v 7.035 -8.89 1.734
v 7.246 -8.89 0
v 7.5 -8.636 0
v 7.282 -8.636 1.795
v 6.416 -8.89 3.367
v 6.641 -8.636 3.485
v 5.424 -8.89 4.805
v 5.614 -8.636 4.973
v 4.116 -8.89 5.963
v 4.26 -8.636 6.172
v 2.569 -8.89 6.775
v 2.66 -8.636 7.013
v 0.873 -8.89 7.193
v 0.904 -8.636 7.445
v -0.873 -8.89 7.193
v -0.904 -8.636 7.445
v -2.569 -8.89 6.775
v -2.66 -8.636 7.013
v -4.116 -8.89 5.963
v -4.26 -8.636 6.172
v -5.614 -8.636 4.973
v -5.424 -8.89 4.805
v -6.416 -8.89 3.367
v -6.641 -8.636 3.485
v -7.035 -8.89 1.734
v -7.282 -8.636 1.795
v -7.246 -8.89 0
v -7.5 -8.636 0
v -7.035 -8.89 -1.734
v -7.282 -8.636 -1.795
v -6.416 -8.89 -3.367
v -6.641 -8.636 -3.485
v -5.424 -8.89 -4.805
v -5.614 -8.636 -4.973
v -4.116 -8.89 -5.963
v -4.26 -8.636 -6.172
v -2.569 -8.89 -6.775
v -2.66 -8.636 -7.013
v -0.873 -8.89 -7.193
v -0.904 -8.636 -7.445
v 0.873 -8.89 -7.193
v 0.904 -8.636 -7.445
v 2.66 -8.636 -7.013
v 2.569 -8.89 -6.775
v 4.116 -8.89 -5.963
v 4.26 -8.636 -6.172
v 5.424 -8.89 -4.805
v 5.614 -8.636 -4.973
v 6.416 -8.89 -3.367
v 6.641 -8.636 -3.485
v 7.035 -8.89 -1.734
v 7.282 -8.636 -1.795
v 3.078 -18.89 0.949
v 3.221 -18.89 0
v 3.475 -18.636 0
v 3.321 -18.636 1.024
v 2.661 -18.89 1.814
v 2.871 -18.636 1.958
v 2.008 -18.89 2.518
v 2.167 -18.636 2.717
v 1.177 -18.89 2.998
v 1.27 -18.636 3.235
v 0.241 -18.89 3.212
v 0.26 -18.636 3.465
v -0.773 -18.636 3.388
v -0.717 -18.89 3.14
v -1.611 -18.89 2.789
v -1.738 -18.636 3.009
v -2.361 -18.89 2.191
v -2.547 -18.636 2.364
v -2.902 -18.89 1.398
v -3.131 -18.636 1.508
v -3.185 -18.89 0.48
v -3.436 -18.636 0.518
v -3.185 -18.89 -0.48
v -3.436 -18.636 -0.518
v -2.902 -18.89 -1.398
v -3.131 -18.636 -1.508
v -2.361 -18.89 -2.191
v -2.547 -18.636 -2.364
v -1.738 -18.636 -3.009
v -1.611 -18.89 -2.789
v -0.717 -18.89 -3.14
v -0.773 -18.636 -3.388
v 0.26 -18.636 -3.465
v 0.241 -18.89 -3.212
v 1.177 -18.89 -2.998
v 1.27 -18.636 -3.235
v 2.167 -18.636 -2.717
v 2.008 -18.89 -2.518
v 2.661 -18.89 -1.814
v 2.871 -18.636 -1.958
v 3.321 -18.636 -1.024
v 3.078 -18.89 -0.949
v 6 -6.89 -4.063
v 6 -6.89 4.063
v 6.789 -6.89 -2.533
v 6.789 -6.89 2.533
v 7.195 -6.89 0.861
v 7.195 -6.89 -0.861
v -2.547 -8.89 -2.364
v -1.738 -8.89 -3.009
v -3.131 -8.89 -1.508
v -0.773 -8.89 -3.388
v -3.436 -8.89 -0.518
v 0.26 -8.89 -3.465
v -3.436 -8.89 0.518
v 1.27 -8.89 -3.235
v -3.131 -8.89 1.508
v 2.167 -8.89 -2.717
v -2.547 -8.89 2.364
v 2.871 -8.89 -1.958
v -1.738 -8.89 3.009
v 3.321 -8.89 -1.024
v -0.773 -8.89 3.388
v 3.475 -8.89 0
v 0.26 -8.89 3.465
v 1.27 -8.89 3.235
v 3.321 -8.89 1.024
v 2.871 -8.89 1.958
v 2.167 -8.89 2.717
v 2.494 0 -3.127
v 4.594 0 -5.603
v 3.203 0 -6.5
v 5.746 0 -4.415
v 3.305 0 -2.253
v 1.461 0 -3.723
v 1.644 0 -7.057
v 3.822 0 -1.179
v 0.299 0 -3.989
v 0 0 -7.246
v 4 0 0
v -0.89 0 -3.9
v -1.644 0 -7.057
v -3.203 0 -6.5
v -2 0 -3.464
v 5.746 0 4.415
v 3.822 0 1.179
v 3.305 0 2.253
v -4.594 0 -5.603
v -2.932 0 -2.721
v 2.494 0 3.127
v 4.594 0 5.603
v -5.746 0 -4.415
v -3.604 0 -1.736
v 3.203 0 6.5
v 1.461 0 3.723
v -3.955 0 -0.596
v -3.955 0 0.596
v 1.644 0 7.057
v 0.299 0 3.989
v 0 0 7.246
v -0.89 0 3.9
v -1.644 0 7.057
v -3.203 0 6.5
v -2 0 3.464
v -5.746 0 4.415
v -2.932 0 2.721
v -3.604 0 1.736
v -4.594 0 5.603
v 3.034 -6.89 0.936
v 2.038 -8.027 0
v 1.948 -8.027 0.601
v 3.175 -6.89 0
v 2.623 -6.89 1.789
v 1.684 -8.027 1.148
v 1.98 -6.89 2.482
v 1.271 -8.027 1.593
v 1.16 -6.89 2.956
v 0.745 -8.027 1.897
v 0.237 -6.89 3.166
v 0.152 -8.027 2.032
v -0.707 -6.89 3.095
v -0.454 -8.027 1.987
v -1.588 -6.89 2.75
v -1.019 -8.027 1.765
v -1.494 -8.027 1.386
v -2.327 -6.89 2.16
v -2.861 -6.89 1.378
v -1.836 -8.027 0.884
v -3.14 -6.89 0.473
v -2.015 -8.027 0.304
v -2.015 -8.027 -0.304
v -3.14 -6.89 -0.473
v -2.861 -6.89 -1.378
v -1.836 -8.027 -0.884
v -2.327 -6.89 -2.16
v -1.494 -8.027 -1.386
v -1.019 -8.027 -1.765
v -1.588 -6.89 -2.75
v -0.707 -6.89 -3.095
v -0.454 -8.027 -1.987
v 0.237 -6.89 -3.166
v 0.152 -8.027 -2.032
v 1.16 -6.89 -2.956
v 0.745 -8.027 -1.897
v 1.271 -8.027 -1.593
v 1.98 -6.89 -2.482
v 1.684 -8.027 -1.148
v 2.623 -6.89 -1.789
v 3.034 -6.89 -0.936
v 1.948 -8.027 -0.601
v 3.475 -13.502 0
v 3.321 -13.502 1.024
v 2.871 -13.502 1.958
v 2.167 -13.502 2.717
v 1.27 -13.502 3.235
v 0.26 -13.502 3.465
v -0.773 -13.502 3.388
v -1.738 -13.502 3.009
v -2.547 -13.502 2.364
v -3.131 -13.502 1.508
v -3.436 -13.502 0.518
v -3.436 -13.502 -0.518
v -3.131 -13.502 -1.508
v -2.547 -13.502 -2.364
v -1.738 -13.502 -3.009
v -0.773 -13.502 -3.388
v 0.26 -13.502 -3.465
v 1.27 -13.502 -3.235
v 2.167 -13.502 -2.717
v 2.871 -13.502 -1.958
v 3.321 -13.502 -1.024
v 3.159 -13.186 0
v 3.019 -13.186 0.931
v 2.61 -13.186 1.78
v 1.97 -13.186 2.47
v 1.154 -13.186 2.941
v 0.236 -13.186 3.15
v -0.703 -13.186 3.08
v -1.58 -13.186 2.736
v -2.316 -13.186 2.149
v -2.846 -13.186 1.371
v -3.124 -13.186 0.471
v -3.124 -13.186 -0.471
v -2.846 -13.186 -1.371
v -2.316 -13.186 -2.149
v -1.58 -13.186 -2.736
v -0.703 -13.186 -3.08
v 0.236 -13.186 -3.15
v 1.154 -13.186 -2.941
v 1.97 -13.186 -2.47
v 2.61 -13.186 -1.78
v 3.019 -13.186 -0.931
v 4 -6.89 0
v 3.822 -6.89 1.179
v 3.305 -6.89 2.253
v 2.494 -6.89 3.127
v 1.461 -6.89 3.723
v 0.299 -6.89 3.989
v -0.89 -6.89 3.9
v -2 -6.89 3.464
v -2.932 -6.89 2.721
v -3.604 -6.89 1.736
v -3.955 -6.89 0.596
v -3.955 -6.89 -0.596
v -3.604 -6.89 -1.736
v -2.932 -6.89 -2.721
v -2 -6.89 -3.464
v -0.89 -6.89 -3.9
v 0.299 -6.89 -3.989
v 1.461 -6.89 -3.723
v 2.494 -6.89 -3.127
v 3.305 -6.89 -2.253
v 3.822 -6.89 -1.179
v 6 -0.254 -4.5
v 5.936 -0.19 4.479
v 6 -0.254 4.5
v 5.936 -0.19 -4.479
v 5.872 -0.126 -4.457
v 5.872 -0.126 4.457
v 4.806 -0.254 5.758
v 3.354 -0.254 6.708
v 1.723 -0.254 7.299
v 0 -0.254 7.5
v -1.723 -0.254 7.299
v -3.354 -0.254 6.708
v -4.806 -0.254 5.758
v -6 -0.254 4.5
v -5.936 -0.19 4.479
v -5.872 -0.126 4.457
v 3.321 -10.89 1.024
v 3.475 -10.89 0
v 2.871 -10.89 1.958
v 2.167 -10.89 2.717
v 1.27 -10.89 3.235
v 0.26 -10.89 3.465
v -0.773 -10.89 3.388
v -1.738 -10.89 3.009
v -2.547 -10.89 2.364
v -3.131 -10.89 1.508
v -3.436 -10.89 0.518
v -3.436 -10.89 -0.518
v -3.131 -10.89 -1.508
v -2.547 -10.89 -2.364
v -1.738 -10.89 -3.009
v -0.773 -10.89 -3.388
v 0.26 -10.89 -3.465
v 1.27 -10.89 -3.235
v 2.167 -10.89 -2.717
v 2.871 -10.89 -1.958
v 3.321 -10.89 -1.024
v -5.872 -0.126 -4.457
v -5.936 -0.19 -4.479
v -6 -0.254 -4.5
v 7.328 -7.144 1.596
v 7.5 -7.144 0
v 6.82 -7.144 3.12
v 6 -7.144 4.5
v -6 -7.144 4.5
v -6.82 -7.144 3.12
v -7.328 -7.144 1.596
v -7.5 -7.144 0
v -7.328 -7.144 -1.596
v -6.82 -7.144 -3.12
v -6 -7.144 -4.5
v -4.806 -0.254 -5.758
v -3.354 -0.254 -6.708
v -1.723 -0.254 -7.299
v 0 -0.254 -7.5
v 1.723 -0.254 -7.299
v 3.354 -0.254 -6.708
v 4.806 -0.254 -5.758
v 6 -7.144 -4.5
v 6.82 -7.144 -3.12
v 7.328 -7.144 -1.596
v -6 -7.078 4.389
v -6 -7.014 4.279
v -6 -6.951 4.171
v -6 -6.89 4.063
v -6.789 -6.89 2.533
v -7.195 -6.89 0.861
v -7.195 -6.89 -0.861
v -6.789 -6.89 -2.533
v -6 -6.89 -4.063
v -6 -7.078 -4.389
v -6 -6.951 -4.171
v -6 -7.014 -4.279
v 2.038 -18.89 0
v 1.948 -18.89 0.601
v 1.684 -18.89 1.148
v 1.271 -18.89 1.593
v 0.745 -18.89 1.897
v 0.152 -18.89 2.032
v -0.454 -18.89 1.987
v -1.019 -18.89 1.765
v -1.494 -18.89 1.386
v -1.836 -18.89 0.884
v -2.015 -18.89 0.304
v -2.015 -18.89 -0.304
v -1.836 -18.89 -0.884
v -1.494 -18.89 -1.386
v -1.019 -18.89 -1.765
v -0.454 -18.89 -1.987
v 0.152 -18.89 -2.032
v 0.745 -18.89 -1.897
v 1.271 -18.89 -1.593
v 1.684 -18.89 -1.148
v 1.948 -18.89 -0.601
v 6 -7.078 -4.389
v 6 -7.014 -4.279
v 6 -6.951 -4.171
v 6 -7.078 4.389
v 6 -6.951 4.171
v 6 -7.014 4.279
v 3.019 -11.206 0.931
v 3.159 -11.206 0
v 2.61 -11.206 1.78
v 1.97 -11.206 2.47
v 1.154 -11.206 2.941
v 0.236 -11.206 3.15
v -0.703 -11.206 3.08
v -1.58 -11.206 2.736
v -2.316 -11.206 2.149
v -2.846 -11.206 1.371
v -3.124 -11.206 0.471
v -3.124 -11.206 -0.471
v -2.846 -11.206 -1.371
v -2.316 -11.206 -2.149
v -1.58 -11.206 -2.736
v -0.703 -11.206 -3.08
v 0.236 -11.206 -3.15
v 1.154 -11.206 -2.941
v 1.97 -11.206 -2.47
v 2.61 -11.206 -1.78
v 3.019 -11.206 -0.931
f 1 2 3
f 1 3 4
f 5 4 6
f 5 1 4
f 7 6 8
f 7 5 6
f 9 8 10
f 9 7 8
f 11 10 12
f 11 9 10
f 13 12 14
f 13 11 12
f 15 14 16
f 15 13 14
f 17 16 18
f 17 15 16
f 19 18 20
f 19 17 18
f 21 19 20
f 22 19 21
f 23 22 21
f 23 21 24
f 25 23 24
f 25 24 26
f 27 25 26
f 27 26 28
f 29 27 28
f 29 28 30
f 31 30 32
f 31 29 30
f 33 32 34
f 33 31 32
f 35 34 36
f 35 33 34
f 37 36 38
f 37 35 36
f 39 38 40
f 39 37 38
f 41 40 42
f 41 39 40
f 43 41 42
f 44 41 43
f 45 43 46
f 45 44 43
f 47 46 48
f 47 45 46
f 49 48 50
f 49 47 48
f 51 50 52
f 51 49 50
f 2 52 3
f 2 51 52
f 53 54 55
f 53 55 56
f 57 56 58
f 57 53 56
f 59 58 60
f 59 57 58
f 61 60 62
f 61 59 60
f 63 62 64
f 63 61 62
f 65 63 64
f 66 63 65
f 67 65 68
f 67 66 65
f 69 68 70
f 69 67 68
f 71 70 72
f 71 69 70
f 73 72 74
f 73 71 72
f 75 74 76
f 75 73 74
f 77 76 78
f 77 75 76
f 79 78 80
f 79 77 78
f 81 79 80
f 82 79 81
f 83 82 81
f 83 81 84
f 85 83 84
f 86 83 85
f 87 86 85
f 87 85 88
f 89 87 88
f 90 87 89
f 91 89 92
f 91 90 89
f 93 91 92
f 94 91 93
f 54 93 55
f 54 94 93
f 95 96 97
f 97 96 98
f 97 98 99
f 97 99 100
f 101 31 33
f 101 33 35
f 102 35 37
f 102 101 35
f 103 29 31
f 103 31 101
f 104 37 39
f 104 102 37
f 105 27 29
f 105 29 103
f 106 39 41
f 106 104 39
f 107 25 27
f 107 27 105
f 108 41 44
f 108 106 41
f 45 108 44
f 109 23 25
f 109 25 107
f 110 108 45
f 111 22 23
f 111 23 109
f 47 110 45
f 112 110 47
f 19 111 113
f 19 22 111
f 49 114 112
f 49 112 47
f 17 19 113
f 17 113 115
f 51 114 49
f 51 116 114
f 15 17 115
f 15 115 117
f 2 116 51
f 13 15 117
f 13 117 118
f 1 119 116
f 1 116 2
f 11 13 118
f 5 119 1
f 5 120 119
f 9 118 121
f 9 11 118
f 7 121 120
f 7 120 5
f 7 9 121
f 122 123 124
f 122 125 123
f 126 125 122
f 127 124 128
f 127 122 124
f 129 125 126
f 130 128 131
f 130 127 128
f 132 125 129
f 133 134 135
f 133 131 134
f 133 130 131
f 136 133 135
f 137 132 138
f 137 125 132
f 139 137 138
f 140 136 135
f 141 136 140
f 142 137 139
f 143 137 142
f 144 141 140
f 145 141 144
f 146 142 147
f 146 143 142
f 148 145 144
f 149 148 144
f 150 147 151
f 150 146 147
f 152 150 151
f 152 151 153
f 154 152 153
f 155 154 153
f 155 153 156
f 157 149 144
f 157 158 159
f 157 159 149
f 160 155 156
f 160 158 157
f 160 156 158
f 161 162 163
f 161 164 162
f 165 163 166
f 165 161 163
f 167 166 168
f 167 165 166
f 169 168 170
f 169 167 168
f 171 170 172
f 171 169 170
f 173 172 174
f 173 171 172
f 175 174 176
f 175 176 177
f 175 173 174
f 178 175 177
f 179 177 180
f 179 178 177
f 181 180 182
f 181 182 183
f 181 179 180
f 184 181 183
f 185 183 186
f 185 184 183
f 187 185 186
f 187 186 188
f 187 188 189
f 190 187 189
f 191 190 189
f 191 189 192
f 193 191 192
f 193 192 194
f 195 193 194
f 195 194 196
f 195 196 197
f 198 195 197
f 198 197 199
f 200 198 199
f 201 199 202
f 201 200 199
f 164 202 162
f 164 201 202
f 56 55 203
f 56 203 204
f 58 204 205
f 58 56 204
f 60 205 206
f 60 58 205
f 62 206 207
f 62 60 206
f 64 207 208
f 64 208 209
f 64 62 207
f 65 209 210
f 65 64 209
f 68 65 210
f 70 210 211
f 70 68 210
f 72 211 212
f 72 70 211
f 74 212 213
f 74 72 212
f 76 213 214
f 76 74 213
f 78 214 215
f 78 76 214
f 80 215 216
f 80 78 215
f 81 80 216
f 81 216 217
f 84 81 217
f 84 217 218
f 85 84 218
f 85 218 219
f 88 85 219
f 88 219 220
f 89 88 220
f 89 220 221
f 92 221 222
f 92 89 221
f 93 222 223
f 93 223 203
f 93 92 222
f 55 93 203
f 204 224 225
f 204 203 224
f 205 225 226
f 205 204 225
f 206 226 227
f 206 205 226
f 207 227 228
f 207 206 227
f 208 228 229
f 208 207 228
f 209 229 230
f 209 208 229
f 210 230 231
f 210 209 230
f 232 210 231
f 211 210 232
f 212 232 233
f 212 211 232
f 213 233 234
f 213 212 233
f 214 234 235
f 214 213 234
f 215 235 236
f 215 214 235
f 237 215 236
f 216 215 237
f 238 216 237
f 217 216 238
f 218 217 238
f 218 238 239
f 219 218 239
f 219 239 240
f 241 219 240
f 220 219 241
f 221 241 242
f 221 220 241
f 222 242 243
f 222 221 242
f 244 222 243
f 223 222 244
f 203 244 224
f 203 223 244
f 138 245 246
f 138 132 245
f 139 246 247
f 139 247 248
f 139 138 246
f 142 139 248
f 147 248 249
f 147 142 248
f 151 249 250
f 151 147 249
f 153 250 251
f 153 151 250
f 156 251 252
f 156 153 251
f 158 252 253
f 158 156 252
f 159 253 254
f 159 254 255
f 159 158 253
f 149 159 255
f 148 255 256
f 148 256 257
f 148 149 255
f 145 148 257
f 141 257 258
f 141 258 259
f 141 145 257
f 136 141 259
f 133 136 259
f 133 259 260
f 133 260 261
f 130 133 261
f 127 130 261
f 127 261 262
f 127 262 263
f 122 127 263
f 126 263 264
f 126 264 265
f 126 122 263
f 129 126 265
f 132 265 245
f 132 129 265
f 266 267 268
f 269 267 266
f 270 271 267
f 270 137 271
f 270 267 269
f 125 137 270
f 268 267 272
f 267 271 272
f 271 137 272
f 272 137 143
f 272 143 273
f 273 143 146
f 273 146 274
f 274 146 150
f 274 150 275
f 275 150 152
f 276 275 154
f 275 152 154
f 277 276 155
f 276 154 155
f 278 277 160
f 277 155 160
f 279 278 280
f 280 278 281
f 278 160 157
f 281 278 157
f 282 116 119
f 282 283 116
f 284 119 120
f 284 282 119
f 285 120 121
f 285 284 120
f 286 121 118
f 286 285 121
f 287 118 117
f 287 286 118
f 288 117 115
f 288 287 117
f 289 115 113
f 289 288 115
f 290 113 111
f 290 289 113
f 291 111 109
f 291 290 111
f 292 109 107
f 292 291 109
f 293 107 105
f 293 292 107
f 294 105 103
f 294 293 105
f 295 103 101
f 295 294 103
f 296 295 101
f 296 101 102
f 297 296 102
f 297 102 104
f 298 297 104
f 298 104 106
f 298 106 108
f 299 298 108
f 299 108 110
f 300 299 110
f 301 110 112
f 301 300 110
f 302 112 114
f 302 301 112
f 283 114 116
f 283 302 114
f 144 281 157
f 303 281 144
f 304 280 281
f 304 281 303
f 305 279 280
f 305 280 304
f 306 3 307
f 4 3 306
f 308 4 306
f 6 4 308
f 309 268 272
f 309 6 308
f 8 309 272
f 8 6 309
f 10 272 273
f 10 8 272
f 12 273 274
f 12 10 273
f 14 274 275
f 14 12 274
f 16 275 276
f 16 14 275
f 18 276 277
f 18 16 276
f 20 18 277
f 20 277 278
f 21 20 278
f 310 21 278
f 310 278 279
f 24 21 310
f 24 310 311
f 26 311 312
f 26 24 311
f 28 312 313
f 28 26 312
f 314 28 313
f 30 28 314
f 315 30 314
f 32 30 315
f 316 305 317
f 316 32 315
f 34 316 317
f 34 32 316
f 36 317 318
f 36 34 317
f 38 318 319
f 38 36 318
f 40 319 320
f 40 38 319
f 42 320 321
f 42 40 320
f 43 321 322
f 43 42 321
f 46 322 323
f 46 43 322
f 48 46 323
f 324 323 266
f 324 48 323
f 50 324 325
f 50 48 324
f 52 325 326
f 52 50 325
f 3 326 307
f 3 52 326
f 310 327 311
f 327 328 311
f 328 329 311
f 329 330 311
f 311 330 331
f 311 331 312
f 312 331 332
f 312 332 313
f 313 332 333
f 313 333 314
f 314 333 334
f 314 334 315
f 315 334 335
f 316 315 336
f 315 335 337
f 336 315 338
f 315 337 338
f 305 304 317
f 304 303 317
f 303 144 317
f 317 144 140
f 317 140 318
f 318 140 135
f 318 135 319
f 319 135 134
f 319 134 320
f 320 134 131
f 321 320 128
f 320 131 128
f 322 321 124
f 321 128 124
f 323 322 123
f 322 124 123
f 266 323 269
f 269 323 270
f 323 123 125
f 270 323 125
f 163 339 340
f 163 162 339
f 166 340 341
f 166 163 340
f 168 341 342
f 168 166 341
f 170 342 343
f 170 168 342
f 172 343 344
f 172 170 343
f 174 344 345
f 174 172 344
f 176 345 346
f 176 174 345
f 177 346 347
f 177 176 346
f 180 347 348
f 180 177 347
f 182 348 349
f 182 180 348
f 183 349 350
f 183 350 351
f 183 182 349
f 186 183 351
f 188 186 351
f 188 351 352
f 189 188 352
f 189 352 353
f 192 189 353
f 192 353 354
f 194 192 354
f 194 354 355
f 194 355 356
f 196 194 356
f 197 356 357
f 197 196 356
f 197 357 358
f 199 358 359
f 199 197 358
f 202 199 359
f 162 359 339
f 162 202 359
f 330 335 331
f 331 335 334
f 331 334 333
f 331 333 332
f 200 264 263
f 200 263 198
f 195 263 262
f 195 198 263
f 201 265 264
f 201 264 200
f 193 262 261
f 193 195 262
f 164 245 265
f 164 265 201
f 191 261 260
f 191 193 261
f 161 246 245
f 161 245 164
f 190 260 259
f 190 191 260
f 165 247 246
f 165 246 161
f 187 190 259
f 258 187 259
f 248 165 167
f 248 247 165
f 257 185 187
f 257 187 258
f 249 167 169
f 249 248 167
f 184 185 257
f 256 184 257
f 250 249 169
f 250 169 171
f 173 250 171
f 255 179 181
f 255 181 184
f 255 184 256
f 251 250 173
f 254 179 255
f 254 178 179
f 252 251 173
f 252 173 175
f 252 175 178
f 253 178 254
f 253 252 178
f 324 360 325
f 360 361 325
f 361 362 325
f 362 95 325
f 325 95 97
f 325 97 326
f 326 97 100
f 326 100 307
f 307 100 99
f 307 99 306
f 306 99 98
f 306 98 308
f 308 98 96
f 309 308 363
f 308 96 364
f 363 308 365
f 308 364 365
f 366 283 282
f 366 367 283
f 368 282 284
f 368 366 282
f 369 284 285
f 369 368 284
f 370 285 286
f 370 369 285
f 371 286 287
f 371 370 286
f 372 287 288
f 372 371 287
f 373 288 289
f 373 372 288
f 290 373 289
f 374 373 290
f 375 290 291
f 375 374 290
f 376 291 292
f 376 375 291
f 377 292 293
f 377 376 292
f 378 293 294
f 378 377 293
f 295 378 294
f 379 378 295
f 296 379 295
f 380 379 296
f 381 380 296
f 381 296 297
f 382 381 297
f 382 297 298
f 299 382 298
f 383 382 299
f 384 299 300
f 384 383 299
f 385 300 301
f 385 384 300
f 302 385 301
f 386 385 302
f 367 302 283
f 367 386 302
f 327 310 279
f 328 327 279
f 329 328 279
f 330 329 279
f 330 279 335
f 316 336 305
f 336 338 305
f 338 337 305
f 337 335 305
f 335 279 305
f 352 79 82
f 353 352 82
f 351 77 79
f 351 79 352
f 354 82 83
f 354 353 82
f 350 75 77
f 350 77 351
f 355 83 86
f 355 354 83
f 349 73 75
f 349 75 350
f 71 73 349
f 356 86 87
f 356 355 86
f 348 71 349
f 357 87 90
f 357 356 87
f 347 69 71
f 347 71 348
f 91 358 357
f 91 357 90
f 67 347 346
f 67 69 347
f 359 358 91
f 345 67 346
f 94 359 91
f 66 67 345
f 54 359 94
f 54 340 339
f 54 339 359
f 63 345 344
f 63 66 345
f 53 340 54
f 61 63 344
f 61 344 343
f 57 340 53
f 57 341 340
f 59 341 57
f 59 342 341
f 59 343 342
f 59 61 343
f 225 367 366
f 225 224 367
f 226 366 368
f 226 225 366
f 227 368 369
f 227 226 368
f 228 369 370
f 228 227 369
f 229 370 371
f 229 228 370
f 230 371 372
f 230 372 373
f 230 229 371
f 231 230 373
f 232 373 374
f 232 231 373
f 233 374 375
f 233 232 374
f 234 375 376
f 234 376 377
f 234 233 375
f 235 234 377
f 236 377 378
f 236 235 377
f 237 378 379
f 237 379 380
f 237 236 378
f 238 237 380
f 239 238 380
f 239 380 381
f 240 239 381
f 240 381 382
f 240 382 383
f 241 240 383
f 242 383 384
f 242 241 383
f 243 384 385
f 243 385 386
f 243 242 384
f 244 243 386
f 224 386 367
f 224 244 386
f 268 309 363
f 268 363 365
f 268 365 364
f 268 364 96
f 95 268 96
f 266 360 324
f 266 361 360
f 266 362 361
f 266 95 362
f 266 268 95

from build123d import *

# Parameters (mm, degrees)
SKETCH2_W          = 20.13485227
SKETCH2_H          = 29.427861008
SKETCH2_W_2        = 12
SKETCH2_H_2        = 20.553456266
CUT_EXTRUDE1_DEPTH = 6.89
CHAMFER2_SIZE      = 0.254
CHAMFER4_SIZE      = 0.254
CHAMFER5_SIZE      = 0.254


with BuildPart() as part:
    # Sketch1 → Revolve1 (revolve)
    with BuildSketch(Plane.XY):
        Polygon((7.5, 0), (7.5, -8.89), (3.475, -8.89), (3.475, -10.89), (3.159135291, -11.205864709), (3.159135291, -13.185864709), (3.475, -13.501729418), (3.475, -18.89), (2.0381, -18.89), (2.0381, -8.0269), (3.175, -6.89), (4, -6.89), (4, 0), align=None)
    revolve(axis=Axis((0, 0, 0), (0, -1, 0)))

    # Sketch2 → Cut-Extrude1 (cut)
    with BuildSketch(Plane(origin=(0, 0, 0), x_dir=(1, 0, 0), z_dir=(0, 1, 0))):
        Rectangle(SKETCH2_W, SKETCH2_H)
        Rectangle(SKETCH2_W_2, SKETCH2_H_2, mode=Mode.SUBTRACT)
    extrude(amount=-CUT_EXTRUDE1_DEPTH, mode=Mode.SUBTRACT)

    # Chamfer2
    chamfer2_edges = [part.edges().sort_by_distance(p)[0] for p in [
        (-3.475, -18.89, 0),
        (-7.5, -8.89, 0),
    ]]
    chamfer(chamfer2_edges, length=CHAMFER2_SIZE)

    # Chamfer4
    chamfer4_edges = [part.edges().sort_by_distance(p)[0] for p in [
        (0, 0, -7.5),
        (0, 0, 7.5),
        (6, 0, 0),
        (-6, 0, 0),
    ]]
    chamfer(chamfer4_edges, length=CHAMFER4_SIZE)

    # Chamfer5
    chamfer5_edges = [part.edges().sort_by_distance(p)[0] for p in [
        (-7.5, -6.89, 0),
        (7.115124735, -6.89, 2.371708245),
    ]]
    chamfer(chamfer5_edges, length=CHAMFER5_SIZE)


solid = part.part
